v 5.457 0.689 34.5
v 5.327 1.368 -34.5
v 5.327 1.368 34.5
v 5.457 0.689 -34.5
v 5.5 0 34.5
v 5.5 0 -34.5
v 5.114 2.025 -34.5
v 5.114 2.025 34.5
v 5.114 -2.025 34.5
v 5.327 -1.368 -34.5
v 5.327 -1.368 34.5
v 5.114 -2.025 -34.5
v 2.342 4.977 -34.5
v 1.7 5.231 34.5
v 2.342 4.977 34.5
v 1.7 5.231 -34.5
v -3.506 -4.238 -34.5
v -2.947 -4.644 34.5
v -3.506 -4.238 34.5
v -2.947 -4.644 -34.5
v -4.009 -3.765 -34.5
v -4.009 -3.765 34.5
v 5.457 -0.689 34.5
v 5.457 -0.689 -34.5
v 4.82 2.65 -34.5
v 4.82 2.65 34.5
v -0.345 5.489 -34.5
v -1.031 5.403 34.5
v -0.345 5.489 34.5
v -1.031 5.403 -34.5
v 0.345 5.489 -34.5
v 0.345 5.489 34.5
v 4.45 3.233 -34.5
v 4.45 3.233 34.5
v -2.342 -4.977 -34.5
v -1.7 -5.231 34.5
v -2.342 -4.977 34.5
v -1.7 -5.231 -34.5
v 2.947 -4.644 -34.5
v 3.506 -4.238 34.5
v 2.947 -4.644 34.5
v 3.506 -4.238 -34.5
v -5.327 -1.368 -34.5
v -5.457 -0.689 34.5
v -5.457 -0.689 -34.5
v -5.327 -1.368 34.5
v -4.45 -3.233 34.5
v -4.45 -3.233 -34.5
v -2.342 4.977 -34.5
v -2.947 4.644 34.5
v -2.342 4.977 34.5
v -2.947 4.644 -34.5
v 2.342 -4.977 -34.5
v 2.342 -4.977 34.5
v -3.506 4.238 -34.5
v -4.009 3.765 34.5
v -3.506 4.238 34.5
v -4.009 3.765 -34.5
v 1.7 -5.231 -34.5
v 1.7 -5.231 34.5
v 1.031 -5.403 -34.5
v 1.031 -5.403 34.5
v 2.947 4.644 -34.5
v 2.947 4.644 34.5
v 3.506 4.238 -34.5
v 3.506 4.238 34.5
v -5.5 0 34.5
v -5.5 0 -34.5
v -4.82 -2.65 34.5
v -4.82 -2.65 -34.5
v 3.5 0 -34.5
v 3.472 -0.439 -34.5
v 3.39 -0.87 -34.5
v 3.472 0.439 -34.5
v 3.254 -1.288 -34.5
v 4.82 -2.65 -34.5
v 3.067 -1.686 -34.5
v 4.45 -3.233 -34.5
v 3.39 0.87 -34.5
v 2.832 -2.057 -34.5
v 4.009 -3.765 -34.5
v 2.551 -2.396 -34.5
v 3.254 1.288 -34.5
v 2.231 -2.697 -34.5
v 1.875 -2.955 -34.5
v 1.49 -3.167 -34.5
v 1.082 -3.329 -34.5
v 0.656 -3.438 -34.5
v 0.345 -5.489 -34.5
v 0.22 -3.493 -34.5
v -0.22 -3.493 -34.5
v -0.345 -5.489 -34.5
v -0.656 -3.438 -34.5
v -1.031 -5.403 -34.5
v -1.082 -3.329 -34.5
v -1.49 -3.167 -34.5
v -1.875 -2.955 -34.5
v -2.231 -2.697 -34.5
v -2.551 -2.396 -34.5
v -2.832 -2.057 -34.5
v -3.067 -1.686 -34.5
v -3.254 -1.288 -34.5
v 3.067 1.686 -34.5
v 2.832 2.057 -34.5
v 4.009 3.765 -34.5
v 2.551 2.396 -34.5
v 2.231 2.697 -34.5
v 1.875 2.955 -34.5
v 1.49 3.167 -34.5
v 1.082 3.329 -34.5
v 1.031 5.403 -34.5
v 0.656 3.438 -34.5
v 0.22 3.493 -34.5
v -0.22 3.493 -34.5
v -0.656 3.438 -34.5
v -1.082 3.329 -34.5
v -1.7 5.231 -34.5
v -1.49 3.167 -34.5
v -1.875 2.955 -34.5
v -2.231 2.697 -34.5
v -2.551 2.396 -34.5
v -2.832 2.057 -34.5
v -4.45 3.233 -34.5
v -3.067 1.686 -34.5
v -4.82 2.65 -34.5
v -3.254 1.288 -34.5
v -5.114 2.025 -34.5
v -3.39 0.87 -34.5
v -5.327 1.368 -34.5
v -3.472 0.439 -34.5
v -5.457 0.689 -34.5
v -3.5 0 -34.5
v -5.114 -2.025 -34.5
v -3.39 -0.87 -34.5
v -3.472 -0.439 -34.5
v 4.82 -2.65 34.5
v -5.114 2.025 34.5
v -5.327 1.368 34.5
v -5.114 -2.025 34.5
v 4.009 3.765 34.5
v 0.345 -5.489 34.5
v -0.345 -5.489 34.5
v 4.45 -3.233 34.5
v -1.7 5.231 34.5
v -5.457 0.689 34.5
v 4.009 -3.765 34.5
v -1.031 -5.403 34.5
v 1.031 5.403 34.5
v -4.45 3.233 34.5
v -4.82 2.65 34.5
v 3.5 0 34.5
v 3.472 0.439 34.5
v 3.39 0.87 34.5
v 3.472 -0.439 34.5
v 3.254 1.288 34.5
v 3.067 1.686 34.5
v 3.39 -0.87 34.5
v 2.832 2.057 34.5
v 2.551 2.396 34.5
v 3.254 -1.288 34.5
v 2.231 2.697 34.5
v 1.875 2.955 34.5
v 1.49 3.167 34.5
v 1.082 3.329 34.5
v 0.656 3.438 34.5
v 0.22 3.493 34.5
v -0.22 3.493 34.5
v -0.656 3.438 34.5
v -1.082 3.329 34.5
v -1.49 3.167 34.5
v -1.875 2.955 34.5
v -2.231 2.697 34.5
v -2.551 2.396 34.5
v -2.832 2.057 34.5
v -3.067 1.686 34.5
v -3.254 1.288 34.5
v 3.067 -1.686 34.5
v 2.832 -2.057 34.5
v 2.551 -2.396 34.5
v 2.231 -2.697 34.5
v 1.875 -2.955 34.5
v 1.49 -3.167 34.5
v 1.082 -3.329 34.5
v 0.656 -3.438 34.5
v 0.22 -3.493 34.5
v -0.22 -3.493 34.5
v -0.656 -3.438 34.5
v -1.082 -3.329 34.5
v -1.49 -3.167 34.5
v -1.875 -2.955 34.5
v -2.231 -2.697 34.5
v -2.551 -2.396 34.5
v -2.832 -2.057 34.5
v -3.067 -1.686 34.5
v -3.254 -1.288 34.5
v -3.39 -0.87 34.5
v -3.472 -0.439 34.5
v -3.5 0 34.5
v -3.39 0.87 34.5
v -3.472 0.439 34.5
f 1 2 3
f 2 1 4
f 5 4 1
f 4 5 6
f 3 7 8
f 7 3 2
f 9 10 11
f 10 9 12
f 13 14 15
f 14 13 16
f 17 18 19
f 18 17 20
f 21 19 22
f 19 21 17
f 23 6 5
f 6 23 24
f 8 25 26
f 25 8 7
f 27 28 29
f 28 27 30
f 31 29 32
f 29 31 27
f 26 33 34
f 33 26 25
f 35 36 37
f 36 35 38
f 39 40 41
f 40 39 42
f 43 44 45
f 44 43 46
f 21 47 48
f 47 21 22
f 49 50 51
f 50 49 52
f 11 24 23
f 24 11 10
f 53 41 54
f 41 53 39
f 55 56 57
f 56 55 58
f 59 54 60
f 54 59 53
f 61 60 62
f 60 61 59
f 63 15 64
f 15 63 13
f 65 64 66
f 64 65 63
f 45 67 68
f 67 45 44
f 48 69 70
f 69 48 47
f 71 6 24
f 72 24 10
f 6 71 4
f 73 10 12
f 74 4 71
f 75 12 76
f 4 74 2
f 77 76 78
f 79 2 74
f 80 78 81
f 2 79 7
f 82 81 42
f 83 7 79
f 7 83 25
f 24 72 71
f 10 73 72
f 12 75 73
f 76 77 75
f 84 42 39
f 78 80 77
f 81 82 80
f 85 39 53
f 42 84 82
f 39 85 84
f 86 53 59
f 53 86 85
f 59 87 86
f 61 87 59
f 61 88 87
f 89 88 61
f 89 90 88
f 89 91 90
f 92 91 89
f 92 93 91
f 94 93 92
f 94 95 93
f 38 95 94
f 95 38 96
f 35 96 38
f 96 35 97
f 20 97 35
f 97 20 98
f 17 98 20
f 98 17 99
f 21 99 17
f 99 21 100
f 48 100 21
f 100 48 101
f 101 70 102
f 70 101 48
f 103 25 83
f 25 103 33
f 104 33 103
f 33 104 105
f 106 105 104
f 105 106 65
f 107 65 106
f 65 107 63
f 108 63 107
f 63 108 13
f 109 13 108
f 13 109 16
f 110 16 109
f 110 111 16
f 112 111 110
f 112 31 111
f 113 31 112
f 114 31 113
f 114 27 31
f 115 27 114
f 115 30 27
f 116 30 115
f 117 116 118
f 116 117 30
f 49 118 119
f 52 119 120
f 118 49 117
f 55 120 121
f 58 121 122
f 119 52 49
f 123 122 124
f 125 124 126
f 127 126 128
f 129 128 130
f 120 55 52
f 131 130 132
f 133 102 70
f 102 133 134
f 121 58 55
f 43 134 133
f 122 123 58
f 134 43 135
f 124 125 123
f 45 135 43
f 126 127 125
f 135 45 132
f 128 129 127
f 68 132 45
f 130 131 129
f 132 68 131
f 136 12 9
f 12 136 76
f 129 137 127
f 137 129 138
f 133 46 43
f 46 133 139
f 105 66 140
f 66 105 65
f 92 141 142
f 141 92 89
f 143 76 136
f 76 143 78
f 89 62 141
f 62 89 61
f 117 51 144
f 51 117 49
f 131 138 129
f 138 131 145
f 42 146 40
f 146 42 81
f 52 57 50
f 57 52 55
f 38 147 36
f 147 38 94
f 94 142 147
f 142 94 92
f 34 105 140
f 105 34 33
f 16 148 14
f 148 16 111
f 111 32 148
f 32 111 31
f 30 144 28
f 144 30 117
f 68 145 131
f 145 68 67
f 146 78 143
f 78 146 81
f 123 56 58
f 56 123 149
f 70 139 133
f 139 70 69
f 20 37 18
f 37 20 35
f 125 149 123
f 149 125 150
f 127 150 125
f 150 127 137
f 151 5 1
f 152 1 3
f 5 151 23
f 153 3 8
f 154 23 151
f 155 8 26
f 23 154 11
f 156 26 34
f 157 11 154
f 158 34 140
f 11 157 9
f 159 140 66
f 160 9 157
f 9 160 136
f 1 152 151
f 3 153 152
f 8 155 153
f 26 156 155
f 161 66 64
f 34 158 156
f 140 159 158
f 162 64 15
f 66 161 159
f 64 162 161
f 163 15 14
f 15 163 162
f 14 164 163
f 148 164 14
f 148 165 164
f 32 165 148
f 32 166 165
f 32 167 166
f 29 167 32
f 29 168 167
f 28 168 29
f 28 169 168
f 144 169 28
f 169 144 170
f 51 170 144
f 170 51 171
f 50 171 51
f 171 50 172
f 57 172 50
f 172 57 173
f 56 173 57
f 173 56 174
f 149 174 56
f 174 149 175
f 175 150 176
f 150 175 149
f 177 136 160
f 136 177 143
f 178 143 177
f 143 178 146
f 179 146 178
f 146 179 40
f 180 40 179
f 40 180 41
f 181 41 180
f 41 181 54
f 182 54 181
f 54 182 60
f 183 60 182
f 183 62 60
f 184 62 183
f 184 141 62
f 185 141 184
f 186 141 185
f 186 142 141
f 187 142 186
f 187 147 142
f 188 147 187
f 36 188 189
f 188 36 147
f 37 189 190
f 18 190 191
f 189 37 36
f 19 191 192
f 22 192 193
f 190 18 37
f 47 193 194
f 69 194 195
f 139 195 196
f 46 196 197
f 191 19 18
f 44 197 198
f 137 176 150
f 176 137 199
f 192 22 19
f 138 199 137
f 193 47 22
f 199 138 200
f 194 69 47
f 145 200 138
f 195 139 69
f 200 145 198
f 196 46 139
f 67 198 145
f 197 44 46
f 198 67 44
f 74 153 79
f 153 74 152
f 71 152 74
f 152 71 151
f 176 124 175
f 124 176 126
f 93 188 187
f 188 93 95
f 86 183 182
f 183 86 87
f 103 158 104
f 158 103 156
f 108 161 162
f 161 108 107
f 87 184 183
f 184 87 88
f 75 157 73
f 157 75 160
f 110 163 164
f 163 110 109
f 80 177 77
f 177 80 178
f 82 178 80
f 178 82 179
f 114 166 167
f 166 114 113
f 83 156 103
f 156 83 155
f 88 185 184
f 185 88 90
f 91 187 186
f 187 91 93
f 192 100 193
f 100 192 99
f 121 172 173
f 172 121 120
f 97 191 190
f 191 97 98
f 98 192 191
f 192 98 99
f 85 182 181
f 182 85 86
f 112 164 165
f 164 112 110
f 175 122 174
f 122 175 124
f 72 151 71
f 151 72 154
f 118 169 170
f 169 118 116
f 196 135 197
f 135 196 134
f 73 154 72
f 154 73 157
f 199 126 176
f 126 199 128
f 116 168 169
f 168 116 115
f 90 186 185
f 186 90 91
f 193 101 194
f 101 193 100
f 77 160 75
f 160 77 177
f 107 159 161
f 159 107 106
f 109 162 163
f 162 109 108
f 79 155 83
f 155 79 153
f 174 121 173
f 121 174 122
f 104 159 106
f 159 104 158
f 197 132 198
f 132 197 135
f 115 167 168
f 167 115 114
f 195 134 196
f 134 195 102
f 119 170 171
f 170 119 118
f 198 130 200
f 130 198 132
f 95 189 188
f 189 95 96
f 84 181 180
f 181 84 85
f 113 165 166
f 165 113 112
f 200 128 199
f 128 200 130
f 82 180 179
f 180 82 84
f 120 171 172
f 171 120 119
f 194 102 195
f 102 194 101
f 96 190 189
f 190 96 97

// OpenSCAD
$fn = 50;


difference() {
	union() {
		translate(v = [0, 0, -34.5000000000]) {
			cylinder(h = 69, r = 5.5000000000);
		}
	}
	union() {
		translate(v = [0, 0, -100.0000000000]) {
			cylinder(h = 200, r = 3.5000000000);
		}
	}
}
